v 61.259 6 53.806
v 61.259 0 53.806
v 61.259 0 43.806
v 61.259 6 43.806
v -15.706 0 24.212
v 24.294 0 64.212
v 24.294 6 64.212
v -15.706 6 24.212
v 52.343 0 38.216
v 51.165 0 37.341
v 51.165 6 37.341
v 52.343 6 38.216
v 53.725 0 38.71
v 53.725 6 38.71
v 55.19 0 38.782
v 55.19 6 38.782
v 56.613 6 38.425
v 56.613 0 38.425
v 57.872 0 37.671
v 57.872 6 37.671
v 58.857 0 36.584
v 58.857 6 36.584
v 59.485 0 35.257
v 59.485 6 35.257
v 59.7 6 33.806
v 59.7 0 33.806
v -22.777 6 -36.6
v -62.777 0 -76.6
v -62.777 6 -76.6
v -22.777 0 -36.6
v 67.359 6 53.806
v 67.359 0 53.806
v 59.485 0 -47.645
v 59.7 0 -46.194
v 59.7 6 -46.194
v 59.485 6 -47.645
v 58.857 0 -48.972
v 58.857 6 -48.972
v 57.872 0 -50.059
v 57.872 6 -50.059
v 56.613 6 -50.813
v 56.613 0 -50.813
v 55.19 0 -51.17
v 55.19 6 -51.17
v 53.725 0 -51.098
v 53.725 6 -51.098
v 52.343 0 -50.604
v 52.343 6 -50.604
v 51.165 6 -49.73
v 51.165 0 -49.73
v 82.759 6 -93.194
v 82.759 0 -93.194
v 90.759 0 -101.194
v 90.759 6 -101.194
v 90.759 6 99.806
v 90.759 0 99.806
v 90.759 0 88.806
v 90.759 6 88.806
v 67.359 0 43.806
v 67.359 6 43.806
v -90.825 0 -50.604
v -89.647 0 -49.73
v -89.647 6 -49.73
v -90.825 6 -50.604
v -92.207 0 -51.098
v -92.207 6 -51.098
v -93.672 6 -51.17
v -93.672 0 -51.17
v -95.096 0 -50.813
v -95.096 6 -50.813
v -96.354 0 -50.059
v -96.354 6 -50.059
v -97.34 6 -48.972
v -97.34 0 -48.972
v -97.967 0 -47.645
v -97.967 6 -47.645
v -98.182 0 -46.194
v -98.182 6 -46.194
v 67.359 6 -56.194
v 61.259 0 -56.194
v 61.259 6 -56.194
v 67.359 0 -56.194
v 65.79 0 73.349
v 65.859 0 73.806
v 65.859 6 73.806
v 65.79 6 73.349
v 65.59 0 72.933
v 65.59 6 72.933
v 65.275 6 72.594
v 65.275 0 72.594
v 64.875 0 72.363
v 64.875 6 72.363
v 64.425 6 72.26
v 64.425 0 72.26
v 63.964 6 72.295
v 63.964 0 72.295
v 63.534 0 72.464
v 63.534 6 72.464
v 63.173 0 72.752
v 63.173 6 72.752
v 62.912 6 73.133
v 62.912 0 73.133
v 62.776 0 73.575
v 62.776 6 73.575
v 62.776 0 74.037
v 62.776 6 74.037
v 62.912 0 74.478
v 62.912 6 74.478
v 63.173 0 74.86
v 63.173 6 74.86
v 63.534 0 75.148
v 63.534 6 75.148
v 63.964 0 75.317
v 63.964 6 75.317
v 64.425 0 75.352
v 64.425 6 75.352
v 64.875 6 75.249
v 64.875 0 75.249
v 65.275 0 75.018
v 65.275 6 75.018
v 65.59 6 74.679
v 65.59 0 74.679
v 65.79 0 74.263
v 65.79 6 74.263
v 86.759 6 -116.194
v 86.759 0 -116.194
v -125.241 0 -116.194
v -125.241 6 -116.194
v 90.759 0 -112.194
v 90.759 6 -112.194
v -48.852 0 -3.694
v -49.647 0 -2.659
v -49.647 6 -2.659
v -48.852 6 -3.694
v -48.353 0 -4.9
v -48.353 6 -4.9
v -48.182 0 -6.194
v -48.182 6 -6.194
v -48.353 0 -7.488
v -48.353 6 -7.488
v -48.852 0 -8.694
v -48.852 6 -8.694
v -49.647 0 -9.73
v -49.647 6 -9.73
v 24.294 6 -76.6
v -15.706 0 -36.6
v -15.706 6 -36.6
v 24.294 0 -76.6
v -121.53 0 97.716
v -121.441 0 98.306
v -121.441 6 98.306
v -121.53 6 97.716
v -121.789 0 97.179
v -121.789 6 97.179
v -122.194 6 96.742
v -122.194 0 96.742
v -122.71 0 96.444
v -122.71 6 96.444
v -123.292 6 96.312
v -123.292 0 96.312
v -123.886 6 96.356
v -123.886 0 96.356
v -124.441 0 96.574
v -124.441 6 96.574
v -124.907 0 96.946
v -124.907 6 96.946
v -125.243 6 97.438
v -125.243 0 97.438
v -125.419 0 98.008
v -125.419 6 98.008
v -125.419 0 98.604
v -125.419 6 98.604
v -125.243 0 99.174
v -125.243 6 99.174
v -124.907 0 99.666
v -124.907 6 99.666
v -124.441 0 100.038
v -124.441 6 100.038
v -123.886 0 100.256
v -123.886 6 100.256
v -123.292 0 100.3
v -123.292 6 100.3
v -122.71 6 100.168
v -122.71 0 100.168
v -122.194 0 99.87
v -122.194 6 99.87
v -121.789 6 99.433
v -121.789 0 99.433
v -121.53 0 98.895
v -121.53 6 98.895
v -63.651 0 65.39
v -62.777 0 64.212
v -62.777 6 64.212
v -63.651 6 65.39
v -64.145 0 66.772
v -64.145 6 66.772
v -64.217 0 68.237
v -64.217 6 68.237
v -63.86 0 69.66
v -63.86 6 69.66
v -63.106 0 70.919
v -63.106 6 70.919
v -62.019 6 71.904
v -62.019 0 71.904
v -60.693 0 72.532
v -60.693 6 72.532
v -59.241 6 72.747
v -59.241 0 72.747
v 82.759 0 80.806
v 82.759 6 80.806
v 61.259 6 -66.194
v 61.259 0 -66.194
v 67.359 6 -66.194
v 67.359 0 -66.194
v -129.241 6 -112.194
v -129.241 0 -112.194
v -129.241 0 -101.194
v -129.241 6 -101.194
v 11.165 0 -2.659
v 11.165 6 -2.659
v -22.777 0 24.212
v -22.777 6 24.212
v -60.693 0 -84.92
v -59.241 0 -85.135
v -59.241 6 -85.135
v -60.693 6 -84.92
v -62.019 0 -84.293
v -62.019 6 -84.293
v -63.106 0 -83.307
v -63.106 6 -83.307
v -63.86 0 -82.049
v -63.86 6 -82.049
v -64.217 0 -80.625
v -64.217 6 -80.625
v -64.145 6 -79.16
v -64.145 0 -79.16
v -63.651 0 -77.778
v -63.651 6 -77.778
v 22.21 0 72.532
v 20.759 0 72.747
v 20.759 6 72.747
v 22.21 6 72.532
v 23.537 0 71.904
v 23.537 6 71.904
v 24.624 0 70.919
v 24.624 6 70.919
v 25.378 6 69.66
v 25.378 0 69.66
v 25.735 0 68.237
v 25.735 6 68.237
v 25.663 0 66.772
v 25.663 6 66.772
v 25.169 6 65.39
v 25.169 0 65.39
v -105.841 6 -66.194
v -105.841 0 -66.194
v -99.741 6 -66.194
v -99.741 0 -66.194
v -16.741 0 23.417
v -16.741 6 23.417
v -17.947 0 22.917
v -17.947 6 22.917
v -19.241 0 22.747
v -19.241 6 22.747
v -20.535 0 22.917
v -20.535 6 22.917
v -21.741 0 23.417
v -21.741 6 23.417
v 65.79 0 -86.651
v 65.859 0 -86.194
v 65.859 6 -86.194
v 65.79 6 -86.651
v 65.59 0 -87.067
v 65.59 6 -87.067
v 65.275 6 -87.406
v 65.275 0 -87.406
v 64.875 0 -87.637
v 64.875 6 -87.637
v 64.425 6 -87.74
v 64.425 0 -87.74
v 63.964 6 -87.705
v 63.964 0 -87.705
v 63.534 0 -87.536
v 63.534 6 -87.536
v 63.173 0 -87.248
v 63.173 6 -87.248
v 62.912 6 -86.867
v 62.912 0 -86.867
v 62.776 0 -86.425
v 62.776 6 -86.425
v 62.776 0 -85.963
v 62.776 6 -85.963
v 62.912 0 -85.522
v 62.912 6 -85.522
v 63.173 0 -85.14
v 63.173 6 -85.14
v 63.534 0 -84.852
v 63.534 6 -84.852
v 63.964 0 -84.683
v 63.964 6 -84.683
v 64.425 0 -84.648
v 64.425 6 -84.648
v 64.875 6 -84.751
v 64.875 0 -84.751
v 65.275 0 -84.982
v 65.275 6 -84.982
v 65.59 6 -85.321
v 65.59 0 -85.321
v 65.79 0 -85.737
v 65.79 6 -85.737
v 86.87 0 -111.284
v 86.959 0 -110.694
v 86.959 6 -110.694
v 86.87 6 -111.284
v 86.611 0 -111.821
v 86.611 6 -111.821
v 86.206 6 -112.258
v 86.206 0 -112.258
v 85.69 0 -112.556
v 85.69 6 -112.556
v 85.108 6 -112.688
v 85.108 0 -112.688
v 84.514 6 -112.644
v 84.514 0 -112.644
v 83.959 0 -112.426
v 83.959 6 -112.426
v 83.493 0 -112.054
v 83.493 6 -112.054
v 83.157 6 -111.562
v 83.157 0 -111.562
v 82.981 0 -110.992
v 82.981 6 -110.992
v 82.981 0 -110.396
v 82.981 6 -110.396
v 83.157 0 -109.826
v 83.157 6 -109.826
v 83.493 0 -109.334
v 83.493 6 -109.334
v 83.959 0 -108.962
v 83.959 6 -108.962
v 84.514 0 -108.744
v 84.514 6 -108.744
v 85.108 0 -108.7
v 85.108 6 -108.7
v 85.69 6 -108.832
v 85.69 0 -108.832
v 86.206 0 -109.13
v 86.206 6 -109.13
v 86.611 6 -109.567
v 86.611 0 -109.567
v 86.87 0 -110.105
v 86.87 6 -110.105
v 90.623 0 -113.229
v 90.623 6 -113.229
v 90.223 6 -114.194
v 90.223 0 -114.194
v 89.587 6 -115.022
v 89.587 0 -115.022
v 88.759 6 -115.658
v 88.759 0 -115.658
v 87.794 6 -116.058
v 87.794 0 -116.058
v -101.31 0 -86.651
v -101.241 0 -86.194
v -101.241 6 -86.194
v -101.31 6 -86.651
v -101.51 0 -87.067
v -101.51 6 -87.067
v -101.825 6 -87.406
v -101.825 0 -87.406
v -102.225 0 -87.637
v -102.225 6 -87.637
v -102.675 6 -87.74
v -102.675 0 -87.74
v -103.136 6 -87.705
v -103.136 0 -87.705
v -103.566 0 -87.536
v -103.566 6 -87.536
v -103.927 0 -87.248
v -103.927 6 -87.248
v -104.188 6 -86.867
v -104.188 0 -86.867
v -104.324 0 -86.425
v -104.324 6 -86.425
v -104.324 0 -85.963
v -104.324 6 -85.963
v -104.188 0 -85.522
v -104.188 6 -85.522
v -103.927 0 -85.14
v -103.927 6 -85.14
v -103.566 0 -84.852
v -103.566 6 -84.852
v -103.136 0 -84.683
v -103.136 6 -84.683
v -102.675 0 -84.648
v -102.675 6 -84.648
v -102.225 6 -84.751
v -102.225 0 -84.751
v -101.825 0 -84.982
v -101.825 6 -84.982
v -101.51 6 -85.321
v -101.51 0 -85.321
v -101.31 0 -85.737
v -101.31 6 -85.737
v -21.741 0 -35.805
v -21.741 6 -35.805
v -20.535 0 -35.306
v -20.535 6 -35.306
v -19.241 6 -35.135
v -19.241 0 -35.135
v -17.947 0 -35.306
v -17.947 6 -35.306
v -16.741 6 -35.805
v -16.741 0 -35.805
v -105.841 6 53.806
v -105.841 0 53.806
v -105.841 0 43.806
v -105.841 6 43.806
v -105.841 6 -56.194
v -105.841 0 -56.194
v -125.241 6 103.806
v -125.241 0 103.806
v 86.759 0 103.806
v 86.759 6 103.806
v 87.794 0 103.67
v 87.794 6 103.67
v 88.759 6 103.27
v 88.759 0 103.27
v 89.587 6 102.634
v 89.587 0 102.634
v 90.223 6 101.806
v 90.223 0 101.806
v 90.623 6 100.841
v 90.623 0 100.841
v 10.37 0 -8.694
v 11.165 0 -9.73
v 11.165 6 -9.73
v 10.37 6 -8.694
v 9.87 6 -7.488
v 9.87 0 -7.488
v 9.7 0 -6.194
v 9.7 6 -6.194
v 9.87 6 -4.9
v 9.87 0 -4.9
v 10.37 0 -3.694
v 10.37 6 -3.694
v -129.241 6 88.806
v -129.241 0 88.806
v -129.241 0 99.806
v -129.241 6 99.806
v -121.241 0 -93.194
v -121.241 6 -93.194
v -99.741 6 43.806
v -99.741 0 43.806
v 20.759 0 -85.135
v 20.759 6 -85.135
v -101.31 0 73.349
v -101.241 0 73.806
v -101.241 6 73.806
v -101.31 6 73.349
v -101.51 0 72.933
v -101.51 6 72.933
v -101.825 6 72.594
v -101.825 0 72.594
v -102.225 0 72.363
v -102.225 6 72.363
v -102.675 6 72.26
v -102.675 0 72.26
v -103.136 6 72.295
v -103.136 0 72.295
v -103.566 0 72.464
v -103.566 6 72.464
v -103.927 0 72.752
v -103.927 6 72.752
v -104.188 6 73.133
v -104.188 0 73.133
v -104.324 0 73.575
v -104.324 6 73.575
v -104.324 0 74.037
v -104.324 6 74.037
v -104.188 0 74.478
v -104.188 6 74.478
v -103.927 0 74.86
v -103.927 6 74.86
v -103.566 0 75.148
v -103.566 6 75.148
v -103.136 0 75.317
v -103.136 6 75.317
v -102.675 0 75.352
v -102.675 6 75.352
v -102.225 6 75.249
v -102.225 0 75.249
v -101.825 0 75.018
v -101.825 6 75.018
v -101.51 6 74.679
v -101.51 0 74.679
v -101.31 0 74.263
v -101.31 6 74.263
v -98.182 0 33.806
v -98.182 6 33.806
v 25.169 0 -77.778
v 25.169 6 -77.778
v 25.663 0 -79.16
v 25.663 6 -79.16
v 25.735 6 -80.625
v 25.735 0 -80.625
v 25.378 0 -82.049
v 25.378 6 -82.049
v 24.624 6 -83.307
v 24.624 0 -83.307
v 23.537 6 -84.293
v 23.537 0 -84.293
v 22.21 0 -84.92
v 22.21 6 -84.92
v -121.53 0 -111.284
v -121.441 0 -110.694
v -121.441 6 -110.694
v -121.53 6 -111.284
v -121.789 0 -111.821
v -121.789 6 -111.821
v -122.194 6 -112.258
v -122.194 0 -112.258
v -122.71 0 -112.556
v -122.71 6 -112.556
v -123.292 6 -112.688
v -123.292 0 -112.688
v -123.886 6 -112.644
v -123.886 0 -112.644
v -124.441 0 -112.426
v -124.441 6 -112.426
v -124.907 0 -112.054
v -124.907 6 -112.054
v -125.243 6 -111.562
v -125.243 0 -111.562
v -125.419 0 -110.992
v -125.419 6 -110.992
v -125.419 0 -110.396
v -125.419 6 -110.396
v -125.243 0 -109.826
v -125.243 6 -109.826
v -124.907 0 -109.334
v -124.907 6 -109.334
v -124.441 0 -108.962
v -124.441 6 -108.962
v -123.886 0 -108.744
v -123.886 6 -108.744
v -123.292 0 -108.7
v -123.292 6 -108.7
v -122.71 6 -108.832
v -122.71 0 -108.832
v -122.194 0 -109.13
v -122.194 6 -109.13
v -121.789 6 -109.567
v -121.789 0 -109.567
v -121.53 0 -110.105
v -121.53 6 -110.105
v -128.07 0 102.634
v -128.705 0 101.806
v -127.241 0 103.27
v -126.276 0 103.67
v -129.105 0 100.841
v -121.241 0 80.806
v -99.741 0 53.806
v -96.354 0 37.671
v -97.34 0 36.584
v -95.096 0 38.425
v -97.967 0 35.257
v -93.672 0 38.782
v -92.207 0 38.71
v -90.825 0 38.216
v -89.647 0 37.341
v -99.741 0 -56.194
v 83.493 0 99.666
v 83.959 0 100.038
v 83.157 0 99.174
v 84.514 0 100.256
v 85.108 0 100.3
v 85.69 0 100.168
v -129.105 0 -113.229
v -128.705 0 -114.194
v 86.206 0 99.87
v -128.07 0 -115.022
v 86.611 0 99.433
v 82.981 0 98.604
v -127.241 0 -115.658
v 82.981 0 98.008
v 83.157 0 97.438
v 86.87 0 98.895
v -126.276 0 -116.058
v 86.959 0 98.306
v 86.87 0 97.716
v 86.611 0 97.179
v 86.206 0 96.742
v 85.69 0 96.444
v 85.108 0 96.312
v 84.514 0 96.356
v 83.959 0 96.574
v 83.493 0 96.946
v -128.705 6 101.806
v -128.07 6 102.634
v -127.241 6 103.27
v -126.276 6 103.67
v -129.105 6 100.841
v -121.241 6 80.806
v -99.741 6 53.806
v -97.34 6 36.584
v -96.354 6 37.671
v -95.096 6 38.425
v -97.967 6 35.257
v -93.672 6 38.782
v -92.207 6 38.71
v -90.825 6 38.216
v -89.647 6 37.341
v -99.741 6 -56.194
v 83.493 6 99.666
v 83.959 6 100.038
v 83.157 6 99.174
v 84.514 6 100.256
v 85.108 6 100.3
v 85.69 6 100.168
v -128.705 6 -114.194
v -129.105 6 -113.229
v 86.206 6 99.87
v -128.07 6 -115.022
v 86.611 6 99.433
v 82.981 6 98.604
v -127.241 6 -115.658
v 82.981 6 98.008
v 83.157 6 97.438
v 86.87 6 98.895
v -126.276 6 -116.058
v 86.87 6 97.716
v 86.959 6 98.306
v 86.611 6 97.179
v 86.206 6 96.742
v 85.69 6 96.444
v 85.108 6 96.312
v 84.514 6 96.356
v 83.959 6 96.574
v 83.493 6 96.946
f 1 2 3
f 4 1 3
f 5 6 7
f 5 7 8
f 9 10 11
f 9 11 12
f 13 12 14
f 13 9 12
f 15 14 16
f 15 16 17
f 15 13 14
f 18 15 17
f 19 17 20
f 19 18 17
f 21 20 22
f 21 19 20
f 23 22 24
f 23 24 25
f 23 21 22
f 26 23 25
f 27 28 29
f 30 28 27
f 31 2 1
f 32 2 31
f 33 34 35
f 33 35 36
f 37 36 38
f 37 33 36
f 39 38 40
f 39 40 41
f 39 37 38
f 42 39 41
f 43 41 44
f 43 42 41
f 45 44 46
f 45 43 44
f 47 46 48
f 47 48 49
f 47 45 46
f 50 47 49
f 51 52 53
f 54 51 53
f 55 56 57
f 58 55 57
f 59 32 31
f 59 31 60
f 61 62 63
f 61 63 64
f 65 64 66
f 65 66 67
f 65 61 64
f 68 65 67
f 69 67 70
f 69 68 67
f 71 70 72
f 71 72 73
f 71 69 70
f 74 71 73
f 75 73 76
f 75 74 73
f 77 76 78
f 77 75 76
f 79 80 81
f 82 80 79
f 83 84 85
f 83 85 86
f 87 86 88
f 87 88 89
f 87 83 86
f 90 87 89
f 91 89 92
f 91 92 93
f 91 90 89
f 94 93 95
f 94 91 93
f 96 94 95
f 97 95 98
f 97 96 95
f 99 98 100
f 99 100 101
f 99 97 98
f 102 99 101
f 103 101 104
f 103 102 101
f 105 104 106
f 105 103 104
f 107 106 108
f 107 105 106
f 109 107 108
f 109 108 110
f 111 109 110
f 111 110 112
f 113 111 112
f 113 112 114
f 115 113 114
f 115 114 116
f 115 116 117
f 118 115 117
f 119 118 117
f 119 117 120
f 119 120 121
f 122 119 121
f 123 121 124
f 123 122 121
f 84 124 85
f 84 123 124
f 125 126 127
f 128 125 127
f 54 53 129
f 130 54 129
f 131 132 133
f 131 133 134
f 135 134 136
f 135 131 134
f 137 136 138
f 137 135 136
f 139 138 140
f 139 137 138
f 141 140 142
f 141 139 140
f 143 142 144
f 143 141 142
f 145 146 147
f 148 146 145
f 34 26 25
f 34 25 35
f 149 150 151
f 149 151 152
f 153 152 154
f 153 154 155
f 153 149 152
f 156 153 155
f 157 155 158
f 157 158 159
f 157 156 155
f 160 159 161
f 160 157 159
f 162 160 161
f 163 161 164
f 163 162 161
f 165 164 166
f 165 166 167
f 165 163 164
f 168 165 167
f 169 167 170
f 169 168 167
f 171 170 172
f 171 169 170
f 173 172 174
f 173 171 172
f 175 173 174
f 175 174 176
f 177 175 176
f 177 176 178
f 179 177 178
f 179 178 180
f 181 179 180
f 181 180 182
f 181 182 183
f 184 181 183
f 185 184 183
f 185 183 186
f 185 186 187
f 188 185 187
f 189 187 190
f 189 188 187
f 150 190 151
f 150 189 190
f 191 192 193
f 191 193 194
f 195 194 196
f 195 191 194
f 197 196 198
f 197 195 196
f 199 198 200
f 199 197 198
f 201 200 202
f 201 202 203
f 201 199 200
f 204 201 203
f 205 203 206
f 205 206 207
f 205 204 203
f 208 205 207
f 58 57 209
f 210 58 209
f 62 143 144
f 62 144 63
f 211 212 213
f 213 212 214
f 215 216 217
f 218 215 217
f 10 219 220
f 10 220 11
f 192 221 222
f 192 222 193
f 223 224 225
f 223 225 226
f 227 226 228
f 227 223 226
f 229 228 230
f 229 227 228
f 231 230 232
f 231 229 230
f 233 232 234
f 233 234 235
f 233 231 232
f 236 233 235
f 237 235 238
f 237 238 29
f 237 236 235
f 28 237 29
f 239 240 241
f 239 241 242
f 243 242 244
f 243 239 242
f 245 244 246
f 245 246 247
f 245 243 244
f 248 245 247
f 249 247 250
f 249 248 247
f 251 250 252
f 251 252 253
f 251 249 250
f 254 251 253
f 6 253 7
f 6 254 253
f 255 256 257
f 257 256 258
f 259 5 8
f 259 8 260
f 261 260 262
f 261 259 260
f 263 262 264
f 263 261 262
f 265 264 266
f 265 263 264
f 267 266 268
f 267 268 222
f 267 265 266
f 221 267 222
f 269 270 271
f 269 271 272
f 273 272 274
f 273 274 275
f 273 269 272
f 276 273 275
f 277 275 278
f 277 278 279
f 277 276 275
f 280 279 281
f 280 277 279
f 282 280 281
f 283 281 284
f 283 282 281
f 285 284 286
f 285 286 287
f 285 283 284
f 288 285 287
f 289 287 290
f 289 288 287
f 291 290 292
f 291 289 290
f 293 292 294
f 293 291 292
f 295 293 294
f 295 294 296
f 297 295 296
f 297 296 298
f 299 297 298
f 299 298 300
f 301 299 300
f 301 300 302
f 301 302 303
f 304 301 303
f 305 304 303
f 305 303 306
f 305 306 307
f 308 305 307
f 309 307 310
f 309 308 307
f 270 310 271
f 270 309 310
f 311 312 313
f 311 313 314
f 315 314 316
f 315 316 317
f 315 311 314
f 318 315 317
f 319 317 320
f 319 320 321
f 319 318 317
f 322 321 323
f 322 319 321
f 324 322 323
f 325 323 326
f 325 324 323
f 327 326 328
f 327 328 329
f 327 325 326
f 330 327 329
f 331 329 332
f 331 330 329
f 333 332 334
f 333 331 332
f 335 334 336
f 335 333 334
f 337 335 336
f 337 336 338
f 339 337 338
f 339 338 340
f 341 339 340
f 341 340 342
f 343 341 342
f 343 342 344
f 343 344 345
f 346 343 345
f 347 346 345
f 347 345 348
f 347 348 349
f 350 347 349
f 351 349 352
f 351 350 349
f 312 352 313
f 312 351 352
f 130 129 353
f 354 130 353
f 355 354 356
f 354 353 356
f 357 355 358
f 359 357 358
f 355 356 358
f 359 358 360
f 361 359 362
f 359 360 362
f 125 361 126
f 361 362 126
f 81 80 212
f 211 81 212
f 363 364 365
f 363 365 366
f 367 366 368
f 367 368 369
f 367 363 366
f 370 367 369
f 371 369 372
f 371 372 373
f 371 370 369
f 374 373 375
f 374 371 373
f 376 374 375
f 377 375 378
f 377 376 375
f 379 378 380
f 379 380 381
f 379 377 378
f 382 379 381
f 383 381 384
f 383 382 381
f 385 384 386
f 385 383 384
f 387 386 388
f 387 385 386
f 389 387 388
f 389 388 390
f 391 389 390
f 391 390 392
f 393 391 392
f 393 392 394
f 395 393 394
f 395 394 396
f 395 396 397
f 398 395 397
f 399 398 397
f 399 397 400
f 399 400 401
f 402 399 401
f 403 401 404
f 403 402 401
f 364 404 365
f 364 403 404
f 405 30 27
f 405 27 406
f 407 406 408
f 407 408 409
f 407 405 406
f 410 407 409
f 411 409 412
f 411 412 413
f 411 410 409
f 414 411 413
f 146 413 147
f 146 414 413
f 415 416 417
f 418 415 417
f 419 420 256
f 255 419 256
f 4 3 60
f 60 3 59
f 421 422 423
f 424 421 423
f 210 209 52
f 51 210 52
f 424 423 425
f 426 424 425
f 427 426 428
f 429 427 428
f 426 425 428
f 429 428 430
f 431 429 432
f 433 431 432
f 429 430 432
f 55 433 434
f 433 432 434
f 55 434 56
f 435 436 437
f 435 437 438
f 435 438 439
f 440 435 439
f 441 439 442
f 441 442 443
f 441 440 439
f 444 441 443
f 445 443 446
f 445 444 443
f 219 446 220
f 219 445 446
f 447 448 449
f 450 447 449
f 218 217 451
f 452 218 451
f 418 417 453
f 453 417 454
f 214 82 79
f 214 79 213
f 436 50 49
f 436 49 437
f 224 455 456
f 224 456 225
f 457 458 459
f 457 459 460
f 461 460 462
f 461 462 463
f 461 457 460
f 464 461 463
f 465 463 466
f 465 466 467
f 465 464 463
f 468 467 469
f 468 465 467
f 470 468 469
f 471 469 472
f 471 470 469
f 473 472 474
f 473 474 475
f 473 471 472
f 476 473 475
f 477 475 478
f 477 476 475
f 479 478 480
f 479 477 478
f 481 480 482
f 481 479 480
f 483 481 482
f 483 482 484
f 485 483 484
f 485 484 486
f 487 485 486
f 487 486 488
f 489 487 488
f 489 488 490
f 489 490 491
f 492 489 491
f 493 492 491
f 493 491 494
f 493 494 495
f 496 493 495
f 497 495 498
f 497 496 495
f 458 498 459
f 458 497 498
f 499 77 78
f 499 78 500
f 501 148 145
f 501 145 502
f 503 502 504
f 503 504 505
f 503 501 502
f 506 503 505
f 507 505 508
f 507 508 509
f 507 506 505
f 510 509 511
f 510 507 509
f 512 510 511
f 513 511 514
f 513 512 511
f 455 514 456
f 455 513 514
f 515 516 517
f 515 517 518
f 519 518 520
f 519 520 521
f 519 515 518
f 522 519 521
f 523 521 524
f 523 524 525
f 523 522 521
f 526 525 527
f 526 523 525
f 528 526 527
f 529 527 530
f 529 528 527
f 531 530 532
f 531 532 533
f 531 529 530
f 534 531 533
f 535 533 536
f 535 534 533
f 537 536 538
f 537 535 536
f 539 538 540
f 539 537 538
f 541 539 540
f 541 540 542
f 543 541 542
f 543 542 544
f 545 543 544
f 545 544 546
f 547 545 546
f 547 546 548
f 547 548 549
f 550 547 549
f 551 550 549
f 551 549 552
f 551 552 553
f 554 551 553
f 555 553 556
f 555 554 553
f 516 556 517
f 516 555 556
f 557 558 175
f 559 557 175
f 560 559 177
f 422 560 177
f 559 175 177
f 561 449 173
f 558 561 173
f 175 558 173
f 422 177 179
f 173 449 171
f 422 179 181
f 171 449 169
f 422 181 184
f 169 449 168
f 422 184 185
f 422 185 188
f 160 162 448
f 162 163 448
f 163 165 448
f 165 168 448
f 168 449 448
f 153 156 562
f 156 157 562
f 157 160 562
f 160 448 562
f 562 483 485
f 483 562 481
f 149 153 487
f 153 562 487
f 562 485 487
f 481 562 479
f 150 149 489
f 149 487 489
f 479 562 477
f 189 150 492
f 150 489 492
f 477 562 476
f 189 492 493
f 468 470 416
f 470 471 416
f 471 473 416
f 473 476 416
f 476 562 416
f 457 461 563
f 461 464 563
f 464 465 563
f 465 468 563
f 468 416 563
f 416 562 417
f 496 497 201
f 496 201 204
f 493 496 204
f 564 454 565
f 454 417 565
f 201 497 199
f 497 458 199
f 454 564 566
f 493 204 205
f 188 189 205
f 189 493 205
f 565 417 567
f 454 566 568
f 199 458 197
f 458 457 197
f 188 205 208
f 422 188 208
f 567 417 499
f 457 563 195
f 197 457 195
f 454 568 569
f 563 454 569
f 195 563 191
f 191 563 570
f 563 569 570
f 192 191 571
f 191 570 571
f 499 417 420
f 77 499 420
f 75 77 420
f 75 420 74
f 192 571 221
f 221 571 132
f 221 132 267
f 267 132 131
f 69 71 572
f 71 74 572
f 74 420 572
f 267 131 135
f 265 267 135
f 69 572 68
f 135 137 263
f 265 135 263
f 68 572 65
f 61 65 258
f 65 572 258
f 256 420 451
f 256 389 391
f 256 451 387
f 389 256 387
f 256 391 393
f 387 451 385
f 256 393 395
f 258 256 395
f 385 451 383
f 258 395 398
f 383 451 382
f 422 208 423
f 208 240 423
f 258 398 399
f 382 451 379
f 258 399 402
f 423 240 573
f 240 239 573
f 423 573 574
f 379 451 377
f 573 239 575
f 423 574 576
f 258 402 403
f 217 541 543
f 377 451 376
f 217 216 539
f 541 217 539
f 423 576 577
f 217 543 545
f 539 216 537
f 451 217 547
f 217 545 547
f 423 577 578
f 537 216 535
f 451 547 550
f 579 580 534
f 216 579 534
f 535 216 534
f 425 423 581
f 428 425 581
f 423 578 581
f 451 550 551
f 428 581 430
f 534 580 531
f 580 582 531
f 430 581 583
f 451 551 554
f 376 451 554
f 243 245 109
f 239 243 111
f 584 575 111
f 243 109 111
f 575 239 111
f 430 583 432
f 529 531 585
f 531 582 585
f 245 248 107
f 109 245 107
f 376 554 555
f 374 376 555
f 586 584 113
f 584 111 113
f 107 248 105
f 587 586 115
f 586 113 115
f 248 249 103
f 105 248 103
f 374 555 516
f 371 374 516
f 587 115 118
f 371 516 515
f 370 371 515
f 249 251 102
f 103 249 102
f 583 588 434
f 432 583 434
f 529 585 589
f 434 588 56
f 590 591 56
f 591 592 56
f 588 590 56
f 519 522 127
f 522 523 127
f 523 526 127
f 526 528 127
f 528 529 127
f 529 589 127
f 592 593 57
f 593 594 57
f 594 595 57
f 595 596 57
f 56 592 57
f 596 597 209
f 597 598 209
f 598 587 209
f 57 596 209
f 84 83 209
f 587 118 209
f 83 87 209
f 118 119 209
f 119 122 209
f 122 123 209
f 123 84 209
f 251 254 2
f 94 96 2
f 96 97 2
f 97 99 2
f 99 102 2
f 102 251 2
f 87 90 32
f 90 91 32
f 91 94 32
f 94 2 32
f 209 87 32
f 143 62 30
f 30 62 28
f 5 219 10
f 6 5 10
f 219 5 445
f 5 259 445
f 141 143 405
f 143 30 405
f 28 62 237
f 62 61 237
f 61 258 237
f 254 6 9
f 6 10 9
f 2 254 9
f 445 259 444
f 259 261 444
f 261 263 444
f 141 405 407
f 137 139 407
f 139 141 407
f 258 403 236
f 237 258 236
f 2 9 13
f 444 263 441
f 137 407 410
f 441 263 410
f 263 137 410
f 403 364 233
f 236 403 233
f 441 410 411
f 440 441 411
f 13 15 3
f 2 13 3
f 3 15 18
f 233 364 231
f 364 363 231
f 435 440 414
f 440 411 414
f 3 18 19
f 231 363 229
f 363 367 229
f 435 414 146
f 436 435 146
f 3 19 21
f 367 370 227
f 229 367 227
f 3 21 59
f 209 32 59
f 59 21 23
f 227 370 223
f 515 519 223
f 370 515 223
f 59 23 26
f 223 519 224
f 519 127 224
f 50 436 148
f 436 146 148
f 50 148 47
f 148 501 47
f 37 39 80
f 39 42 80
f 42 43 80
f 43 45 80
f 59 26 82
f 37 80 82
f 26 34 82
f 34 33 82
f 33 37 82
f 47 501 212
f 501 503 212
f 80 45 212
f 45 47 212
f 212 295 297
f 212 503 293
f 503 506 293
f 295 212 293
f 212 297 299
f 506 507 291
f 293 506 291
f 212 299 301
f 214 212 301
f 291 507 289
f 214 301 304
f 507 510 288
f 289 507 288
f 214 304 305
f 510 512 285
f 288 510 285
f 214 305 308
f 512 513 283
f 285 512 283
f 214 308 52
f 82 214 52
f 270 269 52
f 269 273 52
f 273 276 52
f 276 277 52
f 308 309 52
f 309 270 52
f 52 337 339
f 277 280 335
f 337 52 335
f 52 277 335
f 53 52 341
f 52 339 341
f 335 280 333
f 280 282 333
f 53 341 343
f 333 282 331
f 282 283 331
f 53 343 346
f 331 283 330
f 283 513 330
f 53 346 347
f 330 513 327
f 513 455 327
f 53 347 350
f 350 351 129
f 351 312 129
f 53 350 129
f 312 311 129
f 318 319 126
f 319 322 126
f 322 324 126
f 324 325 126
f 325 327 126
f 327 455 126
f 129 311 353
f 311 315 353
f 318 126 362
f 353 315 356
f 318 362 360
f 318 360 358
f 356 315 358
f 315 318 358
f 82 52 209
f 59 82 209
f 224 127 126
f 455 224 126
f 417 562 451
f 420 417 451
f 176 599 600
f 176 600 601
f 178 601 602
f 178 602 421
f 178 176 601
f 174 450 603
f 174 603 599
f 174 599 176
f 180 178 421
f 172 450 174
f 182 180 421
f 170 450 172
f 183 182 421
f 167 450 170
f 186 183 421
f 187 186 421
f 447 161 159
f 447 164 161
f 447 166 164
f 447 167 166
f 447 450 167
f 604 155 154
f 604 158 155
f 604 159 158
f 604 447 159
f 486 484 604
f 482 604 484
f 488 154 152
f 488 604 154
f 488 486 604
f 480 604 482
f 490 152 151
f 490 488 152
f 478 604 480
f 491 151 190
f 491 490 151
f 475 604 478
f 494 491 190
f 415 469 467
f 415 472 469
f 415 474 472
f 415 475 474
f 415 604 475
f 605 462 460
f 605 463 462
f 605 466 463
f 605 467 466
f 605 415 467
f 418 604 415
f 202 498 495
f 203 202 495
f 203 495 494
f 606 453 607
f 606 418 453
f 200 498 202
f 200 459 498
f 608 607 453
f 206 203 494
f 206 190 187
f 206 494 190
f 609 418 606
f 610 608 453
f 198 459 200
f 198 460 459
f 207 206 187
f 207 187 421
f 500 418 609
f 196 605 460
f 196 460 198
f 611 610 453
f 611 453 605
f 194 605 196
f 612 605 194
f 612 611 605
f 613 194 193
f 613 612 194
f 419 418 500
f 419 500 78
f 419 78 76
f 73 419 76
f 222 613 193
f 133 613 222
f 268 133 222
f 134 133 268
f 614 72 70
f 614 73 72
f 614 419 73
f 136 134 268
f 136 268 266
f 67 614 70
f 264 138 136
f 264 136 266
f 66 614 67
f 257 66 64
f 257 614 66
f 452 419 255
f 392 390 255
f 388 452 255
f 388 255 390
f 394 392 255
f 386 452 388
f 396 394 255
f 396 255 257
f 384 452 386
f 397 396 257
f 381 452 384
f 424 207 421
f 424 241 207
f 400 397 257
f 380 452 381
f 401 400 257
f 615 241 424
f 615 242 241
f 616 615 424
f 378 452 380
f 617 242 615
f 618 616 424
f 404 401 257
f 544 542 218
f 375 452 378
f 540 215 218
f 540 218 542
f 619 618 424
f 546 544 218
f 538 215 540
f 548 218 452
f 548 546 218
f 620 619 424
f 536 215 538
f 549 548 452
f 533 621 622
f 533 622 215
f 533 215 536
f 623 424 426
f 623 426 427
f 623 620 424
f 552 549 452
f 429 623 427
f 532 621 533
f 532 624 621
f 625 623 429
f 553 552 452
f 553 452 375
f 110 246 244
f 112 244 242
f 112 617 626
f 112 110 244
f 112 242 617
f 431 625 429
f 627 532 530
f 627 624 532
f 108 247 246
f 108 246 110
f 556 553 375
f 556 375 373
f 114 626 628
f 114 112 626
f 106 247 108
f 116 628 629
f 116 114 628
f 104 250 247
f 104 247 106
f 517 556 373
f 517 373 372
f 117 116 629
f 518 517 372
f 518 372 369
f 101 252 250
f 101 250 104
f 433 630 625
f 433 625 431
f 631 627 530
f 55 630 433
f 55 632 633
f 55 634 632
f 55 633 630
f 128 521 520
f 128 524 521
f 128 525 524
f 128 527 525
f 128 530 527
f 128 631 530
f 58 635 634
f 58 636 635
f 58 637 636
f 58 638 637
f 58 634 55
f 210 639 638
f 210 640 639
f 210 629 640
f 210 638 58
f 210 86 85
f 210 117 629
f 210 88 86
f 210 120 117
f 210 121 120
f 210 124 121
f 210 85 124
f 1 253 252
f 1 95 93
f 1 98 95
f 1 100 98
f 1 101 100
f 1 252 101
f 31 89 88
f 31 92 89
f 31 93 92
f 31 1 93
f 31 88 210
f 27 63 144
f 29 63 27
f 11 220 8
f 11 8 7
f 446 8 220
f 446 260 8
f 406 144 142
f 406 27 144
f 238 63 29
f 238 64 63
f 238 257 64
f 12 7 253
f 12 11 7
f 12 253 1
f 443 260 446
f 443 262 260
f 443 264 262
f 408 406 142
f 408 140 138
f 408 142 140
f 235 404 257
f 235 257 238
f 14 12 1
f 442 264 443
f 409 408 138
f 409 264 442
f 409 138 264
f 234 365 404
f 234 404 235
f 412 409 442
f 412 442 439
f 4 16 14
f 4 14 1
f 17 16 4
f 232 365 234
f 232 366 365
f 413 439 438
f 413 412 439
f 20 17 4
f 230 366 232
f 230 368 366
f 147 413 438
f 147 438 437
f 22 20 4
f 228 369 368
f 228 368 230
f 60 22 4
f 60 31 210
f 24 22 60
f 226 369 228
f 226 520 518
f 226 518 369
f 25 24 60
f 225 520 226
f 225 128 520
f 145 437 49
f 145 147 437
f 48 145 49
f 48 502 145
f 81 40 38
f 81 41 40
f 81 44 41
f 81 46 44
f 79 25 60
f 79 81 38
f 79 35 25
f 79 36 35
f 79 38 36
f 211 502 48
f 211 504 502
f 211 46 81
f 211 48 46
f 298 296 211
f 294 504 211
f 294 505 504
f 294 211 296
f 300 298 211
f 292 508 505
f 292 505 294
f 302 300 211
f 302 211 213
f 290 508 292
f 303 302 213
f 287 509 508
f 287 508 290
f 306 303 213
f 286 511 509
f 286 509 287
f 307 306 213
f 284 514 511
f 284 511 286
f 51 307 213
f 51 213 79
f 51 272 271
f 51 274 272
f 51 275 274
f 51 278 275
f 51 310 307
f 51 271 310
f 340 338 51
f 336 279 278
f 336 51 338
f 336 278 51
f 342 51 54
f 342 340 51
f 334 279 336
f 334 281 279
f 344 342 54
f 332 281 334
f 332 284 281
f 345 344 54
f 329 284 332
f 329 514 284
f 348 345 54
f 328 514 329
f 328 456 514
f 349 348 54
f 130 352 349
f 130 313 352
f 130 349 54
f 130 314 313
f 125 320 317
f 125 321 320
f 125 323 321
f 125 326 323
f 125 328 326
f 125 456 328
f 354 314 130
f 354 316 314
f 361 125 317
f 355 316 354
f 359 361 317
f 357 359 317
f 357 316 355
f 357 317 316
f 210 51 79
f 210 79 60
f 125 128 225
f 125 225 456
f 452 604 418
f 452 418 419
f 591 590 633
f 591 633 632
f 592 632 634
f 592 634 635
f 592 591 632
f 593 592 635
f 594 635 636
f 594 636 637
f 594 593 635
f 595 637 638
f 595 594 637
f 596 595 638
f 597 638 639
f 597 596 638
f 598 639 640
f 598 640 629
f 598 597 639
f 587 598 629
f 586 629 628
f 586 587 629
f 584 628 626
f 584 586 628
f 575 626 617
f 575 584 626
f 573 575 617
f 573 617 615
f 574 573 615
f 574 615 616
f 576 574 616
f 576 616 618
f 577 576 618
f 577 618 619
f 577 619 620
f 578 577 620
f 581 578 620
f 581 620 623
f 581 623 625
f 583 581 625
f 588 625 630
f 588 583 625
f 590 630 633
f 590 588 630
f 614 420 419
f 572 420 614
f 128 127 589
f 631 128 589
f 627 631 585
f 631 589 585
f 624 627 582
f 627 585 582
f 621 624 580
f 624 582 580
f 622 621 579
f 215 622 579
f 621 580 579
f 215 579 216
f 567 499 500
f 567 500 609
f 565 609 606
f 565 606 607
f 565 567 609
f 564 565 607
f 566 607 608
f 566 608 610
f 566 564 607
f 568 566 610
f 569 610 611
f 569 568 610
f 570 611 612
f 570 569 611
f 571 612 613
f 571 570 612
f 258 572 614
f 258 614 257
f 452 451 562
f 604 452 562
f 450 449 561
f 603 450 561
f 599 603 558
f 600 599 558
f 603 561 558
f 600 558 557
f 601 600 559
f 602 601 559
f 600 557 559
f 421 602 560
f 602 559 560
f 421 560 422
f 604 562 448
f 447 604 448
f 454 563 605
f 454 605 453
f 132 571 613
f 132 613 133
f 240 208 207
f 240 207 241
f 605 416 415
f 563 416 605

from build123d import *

# Parameters (mm, degrees)
SKETCH_1_R      = 2
SKETCH_1_R_2    = 1.55
SKETCH_1_W      = 6.1
SKETCH_1_H      = 10
EXTRUDE_1_DEPTH = 6


with BuildPart() as part:
    # Эскиз1 → Бобышка-Вытянуть1 (new body)
    with BuildSketch(Plane(origin=(0, 0, 0), x_dir=(1, 0, 0), z_dir=(0, 1, 0))):
        with BuildLine():
            Line((-121.241078921, -80.805954046), (-129.241078921, -88.805954046))
            Line((-129.241078921, -88.805954046), (-129.241078921, -99.805954046))
            ThreePointArc((-129.241078921, -99.805954046), (-128.069506046, -102.634381171), (-125.241078921, -103.805954046))
            Line((-125.241078921, -103.805954046), (86.758921079, -103.805954046))
            ThreePointArc((86.758921079, -103.805954046), (89.587348204, -102.634381171), (90.758921079, -99.805954046))
            Line((90.758921079, -99.805954046), (90.758921079, -88.805954046))
            Line((90.758921079, -88.805954046), (82.758921079, -80.805954046))
            Line((82.758921079, -80.805954046), (82.758921079, 93.194045954))
            Line((82.758921079, 93.194045954), (90.758921079, 101.194045954))
            Line((90.758921079, 101.194045954), (90.758921079, 112.194045954))
            ThreePointArc((90.758921079, 112.194045954), (89.587348204, 115.022473079), (86.758921079, 116.194045954))
            Line((86.758921079, 116.194045954), (-125.241078921, 116.194045954))
            ThreePointArc((-125.241078921, 116.194045954), (-128.069506046, 115.022473079), (-129.241078921, 112.194045954))
            Line((-129.241078921, 112.194045954), (-129.241078921, 101.194045954))
            Line((-129.241078921, 101.194045954), (-121.241078921, 93.194045954))
            Line((-121.241078921, 93.194045954), (-121.241078921, -80.805954046))
        make_face()
        with Locations((-123.441078921, -98.305954046)):
            Circle(SKETCH_1_R, mode=Mode.SUBTRACT)
        with Locations((84.958921079, -98.305954046)):
            Circle(SKETCH_1_R, mode=Mode.SUBTRACT)
        with Locations((-123.441078921, 110.694045954)):
            Circle(SKETCH_1_R, mode=Mode.SUBTRACT)
        with Locations((84.958921079, 110.694045954)):
            Circle(SKETCH_1_R, mode=Mode.SUBTRACT)
        with Locations((64.308921079, 86.194045954)):
            Circle(SKETCH_1_R_2, mode=Mode.SUBTRACT)
        with Locations((64.308921079, -73.805954046)):
            Circle(SKETCH_1_R_2, mode=Mode.SUBTRACT)
        with Locations((-102.791078921, -73.805954046)):
            Circle(SKETCH_1_R_2, mode=Mode.SUBTRACT)
        with Locations((-102.791078921, 86.194045954)):
            Circle(SKETCH_1_R_2, mode=Mode.SUBTRACT)
        with Locations((-102.791078921, 61.194045954)):
            Rectangle(SKETCH_1_W, SKETCH_1_H, mode=Mode.SUBTRACT)
        with Locations((64.308921079, -48.805954046)):
            Rectangle(SKETCH_1_W, SKETCH_1_H, mode=Mode.SUBTRACT)
        with BuildLine():
            Line((-59.241078921, -72.747079543), (20.758921079, -72.747079543))
            ThreePointArc((20.758921079, -72.747079543), (25.378318741, -69.660496705), (24.294454985, -64.211545637))
            Line((24.294454985, -64.211545637), (-15.705545015, -24.211545637))
            ThreePointArc((-15.705545015, -24.211545637), (-19.241078921, -22.747079543), (-22.776612827, -24.211545637))
            Line((-22.776612827, -24.211545637), (-62.776612827, -64.211545637))
            ThreePointArc((-62.776612827, -64.211545637), (-63.860476584, -69.660496705), (-59.241078921, -72.747079543))
        make_face(mode=Mode.SUBTRACT)
        with Locations((64.308921079, 61.194045954)):
            Rectangle(SKETCH_1_W, SKETCH_1_H, mode=Mode.SUBTRACT)
        with BuildLine():
            Line((20.758921079, 85.135171451), (-59.241078921, 85.135171451))
            ThreePointArc((-59.241078921, 85.135171451), (-63.860476584, 82.048588613), (-62.776612827, 76.599637545))
            Line((-62.776612827, 76.599637545), (-22.776612827, 36.599637545))
            ThreePointArc((-22.776612827, 36.599637545), (-19.241078921, 35.135171451), (-15.705545015, 36.599637545))
            Line((-15.705545015, 36.599637545), (24.294454985, 76.599637545))
            ThreePointArc((24.294454985, 76.599637545), (25.378318741, 82.048588613), (20.758921079, 85.135171451))
        make_face(mode=Mode.SUBTRACT)
        with BuildLine():
            Line((59.700046576, -33.805954046), (59.700046576, 46.194045954))
            ThreePointArc((59.700046576, 46.194045954), (56.613463738, 50.813443617), (51.16451267, 49.72957986))
            Line((51.16451267, 49.72957986), (11.16451267, 9.72957986))
            ThreePointArc((11.16451267, 9.72957986), (9.700046576, 6.194045954), (11.16451267, 2.658512048))
            Line((11.16451267, 2.658512048), (51.16451267, -37.341487952))
            ThreePointArc((51.16451267, -37.341487952), (56.613463738, -38.425351709), (59.700046576, -33.805954046))
        make_face(mode=Mode.SUBTRACT)
        with BuildLine():
            Line((-98.182204418, 46.194045954), (-98.182204418, -33.805954046))
            ThreePointArc((-98.182204418, -33.805954046), (-95.09562158, -38.425351709), (-89.646670512, -37.341487952))
            Line((-89.646670512, -37.341487952), (-49.646670512, 2.658512048))
            ThreePointArc((-49.646670512, 2.658512048), (-48.182204418, 6.194045954), (-49.646670512, 9.72957986))
            Line((-49.646670512, 9.72957986), (-89.646670512, 49.72957986))
            ThreePointArc((-89.646670512, 49.72957986), (-95.09562158, 50.813443617), (-98.182204418, 46.194045954))
        make_face(mode=Mode.SUBTRACT)
        with Locations((-102.791078921, -48.805954046)):
            Rectangle(SKETCH_1_W, SKETCH_1_H, mode=Mode.SUBTRACT)
    extrude(amount=EXTRUDE_1_DEPTH)


solid = part.part
